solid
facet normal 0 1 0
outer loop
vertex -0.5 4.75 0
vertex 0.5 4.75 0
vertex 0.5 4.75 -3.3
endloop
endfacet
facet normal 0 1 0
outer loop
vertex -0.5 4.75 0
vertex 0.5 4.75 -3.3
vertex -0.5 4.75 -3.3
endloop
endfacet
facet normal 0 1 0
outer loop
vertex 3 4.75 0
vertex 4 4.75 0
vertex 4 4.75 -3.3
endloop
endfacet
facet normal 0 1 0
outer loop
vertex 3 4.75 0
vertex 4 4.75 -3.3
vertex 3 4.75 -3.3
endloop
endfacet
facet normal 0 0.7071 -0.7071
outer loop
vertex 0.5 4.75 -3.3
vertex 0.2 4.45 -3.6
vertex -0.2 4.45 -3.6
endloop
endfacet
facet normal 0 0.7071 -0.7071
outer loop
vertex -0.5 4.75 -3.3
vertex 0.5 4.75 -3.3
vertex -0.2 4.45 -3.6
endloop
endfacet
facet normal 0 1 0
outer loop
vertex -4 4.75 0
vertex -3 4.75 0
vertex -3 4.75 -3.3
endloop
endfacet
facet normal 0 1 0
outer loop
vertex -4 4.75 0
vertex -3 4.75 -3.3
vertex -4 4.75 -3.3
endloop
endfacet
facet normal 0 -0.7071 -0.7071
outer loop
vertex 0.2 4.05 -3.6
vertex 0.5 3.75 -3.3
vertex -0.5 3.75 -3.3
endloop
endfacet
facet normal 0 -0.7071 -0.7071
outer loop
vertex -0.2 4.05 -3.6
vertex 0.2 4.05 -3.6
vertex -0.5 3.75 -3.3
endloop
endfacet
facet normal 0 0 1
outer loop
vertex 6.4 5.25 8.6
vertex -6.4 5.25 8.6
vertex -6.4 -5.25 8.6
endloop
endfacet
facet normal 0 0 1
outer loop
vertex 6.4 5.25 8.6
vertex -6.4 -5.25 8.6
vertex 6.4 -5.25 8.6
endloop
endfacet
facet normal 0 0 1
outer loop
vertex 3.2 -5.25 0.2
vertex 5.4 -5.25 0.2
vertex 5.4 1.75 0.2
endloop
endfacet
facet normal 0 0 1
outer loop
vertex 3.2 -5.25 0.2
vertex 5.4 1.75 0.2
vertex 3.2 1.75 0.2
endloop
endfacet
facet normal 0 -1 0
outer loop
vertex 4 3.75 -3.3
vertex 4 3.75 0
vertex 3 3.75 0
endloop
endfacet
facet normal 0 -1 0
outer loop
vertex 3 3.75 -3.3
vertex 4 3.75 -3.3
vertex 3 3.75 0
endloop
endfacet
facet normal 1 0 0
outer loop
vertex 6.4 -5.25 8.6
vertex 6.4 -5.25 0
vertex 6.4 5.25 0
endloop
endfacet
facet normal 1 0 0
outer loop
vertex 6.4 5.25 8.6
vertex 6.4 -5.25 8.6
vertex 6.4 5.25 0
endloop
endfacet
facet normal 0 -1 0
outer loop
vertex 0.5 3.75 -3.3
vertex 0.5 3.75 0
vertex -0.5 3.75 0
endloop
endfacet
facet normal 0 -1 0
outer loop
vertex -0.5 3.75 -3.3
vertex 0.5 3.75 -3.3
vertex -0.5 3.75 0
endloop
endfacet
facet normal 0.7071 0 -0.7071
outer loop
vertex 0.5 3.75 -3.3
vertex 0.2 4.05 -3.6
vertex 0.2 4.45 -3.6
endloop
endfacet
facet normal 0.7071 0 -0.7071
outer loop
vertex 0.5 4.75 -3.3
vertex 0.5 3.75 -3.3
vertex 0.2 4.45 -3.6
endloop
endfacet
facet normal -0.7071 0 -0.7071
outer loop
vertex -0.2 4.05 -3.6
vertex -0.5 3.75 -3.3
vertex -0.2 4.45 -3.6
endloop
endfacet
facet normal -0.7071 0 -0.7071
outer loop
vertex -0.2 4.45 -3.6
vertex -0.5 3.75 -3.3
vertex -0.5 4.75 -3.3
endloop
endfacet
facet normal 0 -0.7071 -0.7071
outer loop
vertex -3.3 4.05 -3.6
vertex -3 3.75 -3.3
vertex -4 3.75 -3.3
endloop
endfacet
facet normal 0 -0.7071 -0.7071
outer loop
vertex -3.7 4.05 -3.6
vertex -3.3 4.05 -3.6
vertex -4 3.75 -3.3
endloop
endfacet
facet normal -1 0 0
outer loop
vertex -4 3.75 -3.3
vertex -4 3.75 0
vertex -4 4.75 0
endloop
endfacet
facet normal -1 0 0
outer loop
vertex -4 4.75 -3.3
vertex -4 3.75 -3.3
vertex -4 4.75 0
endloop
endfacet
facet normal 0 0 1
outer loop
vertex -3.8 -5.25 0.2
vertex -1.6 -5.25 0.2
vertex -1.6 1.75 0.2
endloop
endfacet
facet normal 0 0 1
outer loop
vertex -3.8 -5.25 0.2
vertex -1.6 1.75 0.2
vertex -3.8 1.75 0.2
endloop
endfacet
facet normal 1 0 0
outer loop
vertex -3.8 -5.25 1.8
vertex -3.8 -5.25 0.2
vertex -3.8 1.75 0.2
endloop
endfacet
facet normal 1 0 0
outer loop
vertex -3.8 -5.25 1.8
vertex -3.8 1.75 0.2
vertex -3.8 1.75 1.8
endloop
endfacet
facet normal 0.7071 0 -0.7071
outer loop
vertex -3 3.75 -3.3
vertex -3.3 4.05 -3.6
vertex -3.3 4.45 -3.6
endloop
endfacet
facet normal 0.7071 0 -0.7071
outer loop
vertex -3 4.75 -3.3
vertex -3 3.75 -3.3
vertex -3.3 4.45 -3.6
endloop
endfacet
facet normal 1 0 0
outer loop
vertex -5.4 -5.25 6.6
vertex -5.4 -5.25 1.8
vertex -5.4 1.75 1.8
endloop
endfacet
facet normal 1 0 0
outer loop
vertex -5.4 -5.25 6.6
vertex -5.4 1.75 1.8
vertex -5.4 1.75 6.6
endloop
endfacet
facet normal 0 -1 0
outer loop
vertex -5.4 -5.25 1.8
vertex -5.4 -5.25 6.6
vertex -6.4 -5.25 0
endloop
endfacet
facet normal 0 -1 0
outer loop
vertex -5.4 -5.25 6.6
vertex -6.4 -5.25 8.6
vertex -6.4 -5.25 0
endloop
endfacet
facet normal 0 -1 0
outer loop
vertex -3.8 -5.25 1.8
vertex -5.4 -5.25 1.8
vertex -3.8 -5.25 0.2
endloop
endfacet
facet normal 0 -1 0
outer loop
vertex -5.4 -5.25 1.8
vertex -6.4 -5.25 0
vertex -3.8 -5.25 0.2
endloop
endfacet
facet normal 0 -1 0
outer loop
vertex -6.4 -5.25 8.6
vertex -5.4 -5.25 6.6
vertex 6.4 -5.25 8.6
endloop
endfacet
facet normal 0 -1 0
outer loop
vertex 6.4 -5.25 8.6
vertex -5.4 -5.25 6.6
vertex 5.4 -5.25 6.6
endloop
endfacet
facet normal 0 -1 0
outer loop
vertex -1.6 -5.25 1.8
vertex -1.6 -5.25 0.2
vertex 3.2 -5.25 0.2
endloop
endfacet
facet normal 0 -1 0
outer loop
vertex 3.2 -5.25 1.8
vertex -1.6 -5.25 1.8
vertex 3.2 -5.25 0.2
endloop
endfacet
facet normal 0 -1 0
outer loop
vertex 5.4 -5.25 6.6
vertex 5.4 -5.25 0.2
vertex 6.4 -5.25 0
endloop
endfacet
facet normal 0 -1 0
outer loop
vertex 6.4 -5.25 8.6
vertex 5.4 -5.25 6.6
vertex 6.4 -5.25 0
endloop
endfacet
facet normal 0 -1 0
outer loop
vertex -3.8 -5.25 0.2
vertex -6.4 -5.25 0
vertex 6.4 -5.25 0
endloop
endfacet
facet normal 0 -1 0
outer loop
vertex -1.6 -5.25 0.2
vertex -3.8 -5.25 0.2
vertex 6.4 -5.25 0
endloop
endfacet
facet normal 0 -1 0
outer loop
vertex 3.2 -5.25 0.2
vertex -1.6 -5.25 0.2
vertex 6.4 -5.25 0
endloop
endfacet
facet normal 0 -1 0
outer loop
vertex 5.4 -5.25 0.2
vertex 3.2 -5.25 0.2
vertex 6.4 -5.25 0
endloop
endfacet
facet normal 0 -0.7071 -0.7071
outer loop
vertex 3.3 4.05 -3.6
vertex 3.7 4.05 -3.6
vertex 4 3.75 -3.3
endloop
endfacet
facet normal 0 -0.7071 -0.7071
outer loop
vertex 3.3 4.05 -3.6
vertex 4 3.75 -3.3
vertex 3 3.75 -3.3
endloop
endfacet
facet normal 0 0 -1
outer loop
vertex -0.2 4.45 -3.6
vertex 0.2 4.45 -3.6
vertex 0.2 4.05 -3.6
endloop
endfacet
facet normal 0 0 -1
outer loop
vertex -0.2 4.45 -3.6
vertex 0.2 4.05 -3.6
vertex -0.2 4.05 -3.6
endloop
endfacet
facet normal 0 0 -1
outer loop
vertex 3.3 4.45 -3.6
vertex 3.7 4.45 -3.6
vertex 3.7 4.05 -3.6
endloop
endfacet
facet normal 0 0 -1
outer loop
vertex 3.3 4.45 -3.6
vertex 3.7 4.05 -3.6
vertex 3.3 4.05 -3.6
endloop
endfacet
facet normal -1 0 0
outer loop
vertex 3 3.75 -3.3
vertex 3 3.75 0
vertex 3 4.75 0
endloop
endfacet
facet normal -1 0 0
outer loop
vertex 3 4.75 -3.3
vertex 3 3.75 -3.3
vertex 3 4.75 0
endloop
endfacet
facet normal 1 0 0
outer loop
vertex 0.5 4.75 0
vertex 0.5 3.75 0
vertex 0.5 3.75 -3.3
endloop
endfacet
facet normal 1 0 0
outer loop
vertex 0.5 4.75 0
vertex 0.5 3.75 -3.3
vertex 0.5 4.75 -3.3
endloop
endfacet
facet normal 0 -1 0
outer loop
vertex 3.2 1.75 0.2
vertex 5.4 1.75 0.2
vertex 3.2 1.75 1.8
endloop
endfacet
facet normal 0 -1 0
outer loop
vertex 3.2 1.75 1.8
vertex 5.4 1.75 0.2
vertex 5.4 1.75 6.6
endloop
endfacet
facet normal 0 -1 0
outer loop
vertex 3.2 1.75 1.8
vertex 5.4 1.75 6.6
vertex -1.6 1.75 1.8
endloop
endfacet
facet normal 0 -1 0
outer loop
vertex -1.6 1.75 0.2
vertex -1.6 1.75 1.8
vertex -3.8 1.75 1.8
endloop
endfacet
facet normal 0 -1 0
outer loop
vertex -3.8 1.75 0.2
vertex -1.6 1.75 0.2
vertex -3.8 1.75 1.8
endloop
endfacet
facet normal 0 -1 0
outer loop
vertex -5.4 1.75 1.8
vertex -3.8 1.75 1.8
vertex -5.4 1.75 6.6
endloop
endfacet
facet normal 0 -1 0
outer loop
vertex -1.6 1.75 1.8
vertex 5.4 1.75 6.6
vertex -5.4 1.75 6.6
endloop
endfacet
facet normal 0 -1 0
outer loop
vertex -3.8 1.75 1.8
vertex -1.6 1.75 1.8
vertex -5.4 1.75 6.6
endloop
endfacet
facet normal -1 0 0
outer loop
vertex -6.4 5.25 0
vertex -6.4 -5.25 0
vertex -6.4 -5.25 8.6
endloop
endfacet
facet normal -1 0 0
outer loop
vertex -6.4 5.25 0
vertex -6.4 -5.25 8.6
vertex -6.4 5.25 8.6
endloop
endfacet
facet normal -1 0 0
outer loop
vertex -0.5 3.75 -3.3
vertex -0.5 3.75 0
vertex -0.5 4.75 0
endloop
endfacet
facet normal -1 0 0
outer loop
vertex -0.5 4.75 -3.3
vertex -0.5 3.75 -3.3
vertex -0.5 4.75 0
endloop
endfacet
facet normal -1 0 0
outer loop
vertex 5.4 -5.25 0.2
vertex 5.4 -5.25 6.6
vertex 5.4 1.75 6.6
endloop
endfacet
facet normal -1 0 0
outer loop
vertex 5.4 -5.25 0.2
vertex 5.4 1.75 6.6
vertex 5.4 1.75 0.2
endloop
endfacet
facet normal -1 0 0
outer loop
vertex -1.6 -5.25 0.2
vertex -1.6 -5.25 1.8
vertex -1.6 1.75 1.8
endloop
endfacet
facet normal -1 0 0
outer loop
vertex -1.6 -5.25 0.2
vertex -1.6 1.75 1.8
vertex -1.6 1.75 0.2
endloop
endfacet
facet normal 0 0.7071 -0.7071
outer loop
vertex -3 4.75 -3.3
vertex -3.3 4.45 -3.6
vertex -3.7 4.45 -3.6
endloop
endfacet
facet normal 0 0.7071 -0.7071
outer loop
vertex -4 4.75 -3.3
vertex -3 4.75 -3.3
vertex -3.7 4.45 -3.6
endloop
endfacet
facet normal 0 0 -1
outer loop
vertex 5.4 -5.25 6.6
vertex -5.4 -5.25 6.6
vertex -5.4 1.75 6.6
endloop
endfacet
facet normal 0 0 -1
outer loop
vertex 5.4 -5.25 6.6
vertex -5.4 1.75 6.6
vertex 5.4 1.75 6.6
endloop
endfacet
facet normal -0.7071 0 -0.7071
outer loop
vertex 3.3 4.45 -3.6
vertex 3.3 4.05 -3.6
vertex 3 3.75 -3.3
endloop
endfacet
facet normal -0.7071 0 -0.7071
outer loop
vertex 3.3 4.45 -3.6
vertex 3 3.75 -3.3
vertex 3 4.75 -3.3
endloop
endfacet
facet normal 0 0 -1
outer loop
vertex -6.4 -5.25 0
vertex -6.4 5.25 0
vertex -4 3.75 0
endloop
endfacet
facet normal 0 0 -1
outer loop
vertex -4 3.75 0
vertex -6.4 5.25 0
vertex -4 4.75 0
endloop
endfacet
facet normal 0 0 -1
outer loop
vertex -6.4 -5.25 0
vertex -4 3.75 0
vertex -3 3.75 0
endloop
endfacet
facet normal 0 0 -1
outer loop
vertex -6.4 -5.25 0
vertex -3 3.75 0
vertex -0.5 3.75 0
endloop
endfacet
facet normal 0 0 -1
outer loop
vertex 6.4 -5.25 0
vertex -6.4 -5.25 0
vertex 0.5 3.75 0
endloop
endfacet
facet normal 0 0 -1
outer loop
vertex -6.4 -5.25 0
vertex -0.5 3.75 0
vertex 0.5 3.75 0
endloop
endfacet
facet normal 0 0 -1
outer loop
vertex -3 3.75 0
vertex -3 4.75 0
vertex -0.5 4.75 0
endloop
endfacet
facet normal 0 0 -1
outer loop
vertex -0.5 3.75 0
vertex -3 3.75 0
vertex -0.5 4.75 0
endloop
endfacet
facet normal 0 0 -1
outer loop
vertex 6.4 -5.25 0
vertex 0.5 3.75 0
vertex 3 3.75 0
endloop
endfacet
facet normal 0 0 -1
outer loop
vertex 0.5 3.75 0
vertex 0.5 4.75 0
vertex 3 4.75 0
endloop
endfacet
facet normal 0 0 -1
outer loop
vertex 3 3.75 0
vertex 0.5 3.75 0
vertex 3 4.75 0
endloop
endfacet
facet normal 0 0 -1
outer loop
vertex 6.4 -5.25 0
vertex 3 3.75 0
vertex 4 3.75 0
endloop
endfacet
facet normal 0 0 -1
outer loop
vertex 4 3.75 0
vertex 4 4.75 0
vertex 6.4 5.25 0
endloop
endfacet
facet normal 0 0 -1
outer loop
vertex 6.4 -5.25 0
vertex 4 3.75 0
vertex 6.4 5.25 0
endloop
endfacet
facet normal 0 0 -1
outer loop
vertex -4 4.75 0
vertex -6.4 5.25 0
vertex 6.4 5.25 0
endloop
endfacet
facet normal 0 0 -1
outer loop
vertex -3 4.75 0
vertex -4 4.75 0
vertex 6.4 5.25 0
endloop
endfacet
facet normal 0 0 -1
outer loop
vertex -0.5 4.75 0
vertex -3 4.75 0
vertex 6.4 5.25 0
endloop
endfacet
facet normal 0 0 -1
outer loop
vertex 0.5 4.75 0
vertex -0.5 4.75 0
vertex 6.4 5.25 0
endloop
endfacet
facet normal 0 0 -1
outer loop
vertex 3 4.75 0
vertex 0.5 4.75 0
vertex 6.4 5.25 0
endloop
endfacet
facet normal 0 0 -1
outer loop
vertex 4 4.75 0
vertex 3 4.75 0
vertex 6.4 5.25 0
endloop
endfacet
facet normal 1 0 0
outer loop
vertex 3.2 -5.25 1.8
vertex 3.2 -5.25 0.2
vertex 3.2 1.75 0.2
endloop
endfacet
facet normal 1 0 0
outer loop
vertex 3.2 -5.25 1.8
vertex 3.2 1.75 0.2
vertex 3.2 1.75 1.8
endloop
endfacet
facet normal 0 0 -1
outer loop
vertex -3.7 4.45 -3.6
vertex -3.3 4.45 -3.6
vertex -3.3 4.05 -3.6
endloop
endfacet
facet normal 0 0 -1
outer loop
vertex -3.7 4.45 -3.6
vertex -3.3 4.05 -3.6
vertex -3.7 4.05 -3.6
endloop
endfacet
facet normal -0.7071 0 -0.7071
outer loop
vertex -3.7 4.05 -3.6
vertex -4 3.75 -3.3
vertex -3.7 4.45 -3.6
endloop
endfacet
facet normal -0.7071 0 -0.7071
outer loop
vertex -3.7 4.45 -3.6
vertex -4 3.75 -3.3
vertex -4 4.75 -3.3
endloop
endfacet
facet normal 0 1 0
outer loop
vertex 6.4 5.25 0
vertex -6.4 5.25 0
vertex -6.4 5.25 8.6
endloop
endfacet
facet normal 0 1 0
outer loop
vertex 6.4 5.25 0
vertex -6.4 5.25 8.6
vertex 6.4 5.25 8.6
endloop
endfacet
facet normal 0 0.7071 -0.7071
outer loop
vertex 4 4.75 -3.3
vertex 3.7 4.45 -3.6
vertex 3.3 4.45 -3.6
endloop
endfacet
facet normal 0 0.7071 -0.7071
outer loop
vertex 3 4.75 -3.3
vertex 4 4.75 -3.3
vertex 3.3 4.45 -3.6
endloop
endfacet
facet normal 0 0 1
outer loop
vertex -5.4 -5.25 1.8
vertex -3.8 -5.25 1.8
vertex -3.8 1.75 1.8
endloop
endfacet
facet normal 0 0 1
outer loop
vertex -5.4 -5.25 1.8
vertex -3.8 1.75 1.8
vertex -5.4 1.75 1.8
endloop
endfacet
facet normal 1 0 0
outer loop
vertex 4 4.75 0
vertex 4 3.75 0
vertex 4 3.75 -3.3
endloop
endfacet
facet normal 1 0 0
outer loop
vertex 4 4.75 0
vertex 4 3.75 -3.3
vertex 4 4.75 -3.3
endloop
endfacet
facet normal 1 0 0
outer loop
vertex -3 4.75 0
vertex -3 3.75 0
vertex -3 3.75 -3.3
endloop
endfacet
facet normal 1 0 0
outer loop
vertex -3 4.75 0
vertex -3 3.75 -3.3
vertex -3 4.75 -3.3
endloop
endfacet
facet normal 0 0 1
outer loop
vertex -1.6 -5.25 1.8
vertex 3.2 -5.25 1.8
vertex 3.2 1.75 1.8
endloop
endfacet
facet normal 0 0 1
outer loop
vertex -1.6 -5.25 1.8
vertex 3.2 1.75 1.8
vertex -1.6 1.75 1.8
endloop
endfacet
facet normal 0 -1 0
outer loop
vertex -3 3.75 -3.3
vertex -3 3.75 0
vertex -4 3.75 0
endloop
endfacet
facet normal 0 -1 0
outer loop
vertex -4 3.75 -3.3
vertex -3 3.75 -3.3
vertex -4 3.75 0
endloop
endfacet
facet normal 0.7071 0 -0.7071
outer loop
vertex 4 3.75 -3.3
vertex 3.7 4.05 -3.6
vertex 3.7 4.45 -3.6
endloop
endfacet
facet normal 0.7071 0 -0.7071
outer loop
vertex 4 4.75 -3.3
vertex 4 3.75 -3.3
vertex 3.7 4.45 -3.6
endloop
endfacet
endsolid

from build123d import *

# Parameters (mm, degrees)
SKETCH_1_W                         = 12.8
SKETCH_1_H                         = 10.5
EXTRUDE_1_DEPTH                    = 8.6
CUT_EXTRUDE_1_DEPTH                = 7
EXTRUDE_START                      = -5
SKETCH_3_W                         = 1
SKETCH_3_H                         = 1
EXTRUDE_2_DEPTH                    = 8.6
CHAMFER_1_SIZE                     = 0.3
PATTERN_LINEAR_1_COUNT             = 3
PATTERN_LINEAR_1_PITCH             = 3.5
CHAMFER_1_OF_PATTERN_LINEAR_1_SIZE = 0.3


with BuildPart() as part:
    # Эскиз1 → Бобышка-Вытянуть1 (new body)
    with BuildSketch(Plane.XY):
        Rectangle(SKETCH_1_W, SKETCH_1_H)
    extrude(amount=EXTRUDE_1_DEPTH)

    # Эскиз2 → Вырез-Вытянуть1 (cut)
    with BuildSketch(Plane.XZ.offset(5.25)):
        Polygon((-5.4, 6.6), (5.4, 6.6), (5.4, 0.2), (3.2, 0.2), (3.2, 1.8), (-1.6, 1.8), (-1.6, 0.2), (-3.8, 0.2), (-3.8, 1.8), (-5.4, 1.8), align=None)
    extrude(amount=-CUT_EXTRUDE_1_DEPTH, mode=Mode.SUBTRACT)

    # Эскиз3 → Бобышка-Вытянуть2 (add)
    with BuildSketch(Plane(origin=(0, 0, 0), x_dir=(-1, 0, 0), z_dir=(0, 0, -1)).offset(EXTRUDE_START)):
        with Locations((3.5, 4.25)):
            Rectangle(SKETCH_3_W, SKETCH_3_H)
    extrude_2 = extrude(amount=EXTRUDE_2_DEPTH)

    # Фаска1
    chamfer_1_edges = [part.edges().sort_by_distance(p)[0] for p in [
        (-3, 4.25, -3.6),
        (-3.5, 3.75, -3.6),
        (-4, 4.25, -3.6),
        (-3.5, 4.75, -3.6),
    ]]
    chamfer(chamfer_1_edges, length=CHAMFER_1_SIZE)

    # Линейный массив1: Бобышка-Вытянуть2 ×3
    with Locations(*[(i * PATTERN_LINEAR_1_PITCH, 0, 0) for i in range(1, PATTERN_LINEAR_1_COUNT)]):
        add(extrude_2)

    # Фаска1 of Линейный массив1
    chamfer_1_of_pattern_linear_1_edges = [part.edges().sort_by_distance(p)[0] for p in [
        (0.5, 4.25, -3.6),
        (0, 3.75, -3.6),
        (-0.5, 4.25, -3.6),
        (0, 4.75, -3.6),
        (4, 4.25, -3.6),
        (3.5, 3.75, -3.6),
        (3, 4.25, -3.6),
        (3.5, 4.75, -3.6),
    ]]
    chamfer(chamfer_1_of_pattern_linear_1_edges, length=CHAMFER_1_OF_PATTERN_LINEAR_1_SIZE)


solid = part.part
